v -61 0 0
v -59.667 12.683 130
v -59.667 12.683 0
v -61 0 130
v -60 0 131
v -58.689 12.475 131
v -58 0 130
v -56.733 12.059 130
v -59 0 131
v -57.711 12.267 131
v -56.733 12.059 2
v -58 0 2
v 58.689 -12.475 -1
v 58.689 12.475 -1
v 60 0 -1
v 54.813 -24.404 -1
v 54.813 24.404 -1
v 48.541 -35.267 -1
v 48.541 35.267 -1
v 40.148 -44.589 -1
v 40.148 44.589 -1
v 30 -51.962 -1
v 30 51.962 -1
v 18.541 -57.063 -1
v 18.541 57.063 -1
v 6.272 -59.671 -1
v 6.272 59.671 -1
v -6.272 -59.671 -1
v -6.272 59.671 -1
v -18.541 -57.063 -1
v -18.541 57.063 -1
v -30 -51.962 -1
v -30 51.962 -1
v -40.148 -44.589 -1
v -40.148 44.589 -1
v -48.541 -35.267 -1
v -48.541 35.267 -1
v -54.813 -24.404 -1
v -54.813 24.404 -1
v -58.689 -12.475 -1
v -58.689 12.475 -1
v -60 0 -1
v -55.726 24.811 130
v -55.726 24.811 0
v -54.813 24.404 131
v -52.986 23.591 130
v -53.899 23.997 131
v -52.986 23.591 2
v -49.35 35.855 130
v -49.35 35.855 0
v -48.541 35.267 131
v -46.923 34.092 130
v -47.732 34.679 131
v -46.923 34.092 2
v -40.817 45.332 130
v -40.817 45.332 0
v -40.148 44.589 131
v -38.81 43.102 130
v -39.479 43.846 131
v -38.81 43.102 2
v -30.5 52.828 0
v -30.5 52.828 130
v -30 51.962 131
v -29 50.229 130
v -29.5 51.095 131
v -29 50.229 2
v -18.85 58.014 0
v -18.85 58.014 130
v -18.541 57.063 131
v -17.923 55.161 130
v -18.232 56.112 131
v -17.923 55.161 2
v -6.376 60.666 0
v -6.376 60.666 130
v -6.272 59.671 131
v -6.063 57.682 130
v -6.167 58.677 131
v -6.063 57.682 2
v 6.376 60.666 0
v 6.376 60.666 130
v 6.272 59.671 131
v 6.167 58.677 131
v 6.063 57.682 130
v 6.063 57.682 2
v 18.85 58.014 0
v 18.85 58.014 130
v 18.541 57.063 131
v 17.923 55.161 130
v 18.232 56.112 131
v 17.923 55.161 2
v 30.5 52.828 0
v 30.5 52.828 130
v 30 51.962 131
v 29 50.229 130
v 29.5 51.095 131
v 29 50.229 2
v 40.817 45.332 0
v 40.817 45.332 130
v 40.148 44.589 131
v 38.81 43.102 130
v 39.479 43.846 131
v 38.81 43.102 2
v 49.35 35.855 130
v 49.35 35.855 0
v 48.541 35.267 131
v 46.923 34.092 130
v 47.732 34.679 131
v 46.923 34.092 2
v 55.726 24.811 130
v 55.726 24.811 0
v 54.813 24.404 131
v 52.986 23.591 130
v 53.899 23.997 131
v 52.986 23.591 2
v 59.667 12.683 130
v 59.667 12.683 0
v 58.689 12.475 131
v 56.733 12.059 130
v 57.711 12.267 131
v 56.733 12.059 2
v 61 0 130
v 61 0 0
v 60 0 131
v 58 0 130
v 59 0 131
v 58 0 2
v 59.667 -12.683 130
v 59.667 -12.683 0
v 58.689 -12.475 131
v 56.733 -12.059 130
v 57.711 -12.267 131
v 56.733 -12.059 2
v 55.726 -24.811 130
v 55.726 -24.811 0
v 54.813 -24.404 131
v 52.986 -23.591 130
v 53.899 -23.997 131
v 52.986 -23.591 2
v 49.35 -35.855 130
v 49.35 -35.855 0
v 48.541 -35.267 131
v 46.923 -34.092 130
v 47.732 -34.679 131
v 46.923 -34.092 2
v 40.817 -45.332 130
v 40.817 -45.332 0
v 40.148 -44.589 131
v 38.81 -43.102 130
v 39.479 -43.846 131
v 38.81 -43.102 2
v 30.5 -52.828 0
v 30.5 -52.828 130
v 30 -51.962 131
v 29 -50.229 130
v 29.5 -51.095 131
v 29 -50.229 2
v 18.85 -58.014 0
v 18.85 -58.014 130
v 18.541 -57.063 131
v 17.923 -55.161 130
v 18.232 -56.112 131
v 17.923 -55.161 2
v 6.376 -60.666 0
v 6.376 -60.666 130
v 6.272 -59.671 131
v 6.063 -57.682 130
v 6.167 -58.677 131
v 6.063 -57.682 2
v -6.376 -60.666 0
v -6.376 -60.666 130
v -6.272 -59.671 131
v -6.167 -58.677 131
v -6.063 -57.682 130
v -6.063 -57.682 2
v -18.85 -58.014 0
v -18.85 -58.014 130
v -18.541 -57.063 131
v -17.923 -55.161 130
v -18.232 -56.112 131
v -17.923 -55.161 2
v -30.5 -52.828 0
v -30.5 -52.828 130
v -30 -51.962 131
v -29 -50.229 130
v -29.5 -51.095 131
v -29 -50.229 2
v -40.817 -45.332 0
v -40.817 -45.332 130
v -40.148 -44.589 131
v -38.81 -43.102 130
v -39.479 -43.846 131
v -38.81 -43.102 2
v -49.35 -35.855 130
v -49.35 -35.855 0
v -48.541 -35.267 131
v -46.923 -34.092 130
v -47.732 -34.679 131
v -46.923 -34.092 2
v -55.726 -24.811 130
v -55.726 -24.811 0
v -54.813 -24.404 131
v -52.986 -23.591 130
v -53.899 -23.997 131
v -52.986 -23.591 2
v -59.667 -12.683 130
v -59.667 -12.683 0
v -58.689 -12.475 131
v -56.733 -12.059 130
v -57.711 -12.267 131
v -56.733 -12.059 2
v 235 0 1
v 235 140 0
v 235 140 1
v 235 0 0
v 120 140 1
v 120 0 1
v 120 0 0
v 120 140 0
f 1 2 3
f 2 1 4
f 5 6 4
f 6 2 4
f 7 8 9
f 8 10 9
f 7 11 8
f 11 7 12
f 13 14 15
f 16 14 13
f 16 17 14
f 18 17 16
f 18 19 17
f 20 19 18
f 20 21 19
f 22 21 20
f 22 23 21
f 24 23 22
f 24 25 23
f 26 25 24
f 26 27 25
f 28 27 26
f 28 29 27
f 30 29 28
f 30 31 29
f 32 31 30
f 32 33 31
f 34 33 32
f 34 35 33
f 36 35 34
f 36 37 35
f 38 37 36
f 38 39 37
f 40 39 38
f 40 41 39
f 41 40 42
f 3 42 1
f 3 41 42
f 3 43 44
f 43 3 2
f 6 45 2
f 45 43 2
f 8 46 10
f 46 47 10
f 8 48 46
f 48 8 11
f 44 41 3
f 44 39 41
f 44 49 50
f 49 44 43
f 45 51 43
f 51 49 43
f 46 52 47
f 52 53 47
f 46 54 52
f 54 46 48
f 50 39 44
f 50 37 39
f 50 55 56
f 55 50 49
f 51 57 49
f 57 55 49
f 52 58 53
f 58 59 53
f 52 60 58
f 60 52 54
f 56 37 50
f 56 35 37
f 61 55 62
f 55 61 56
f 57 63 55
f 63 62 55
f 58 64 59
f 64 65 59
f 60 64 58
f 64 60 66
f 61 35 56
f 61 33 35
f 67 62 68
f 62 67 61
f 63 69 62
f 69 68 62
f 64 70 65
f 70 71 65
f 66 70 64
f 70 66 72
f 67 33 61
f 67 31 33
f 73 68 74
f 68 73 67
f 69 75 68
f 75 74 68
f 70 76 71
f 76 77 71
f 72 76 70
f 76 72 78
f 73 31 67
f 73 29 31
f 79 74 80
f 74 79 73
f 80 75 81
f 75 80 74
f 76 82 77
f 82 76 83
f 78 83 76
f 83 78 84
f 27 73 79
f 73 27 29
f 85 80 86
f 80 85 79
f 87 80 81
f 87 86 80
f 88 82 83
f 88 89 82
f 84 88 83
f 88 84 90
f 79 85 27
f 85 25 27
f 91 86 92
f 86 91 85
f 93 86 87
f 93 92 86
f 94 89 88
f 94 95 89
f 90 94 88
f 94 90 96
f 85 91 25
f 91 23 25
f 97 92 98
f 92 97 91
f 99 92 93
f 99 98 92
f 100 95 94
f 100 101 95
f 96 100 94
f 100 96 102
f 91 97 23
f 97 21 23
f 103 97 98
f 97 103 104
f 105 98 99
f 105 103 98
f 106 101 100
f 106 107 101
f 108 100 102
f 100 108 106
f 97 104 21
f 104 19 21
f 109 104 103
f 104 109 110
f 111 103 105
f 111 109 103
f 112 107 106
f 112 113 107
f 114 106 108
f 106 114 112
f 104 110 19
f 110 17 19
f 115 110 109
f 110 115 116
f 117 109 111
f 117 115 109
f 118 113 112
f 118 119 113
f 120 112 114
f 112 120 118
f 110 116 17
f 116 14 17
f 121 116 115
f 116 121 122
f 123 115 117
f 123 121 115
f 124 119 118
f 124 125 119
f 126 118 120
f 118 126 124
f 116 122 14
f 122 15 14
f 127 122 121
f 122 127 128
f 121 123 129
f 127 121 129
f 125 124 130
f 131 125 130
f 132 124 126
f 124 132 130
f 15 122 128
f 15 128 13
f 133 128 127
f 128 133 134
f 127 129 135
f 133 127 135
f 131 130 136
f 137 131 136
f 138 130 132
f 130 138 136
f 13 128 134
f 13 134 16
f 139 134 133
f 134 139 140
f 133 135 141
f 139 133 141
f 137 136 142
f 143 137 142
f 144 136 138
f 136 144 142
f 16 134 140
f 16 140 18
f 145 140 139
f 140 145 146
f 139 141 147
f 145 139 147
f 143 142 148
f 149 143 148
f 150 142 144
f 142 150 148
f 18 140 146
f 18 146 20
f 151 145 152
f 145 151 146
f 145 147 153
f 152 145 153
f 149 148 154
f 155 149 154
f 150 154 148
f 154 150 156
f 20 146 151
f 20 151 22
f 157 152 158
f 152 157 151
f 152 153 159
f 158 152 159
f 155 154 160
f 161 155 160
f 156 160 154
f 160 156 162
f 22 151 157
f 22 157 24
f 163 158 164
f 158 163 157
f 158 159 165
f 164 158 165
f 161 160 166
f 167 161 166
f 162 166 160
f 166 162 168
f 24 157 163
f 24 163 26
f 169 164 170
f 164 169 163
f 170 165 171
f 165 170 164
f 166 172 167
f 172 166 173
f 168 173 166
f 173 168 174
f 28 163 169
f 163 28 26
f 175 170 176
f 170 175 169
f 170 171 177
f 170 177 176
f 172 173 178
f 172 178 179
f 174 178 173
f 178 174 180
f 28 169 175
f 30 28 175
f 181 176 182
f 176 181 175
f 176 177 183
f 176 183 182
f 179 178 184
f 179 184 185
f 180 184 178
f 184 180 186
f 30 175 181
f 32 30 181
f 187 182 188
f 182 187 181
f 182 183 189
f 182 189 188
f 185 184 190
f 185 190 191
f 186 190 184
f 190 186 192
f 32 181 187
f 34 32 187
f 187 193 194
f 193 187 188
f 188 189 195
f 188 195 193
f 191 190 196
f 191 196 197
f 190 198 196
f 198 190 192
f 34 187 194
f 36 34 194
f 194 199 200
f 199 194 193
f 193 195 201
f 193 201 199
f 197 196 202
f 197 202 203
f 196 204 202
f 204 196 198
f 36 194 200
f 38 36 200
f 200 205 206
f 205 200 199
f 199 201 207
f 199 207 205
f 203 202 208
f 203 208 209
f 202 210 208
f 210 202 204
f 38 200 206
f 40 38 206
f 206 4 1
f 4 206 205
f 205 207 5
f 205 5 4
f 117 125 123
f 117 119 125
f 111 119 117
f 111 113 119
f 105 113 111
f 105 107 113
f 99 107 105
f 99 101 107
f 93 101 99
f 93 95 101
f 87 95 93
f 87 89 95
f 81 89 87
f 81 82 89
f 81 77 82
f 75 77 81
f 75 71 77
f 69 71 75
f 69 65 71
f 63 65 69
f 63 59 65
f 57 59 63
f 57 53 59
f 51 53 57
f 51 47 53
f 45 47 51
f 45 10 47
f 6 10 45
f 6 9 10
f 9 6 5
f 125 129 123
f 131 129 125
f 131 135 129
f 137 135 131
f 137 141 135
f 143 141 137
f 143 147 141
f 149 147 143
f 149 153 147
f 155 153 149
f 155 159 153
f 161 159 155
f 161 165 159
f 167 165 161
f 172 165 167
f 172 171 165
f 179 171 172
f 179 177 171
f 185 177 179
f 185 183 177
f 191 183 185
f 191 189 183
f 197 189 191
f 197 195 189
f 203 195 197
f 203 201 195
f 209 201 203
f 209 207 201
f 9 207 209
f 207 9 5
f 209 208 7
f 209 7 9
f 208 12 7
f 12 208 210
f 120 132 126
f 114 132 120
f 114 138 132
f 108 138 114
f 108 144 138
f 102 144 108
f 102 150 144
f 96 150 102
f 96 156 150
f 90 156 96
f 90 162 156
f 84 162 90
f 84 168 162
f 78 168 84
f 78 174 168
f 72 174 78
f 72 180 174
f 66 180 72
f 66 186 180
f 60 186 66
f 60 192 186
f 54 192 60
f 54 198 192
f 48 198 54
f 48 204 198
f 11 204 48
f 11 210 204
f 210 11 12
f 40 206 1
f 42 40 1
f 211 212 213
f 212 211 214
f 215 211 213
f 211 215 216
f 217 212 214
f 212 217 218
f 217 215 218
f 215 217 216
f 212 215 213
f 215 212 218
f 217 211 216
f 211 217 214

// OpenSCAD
outerDiameter = 120;
outerHeight = 130;
wallThickness = 2 - 1;

rotate_extrude(angle=360)
    difference() {
        offset(1)
            polygon([[0,0],
                [outerDiameter/2,0],
                [outerDiameter/2,outerHeight],
                [outerDiameter/2 - wallThickness,outerHeight],
                [outerDiameter/2 - wallThickness,wallThickness],
                [0,wallThickness]
                ]);
        translate([-10/2,0,0])
            square([10,10],center = true);
    }

translate([outerDiameter,0,0])
    cube([outerDiameter-5,outerHeight+10,wallThickness]);
